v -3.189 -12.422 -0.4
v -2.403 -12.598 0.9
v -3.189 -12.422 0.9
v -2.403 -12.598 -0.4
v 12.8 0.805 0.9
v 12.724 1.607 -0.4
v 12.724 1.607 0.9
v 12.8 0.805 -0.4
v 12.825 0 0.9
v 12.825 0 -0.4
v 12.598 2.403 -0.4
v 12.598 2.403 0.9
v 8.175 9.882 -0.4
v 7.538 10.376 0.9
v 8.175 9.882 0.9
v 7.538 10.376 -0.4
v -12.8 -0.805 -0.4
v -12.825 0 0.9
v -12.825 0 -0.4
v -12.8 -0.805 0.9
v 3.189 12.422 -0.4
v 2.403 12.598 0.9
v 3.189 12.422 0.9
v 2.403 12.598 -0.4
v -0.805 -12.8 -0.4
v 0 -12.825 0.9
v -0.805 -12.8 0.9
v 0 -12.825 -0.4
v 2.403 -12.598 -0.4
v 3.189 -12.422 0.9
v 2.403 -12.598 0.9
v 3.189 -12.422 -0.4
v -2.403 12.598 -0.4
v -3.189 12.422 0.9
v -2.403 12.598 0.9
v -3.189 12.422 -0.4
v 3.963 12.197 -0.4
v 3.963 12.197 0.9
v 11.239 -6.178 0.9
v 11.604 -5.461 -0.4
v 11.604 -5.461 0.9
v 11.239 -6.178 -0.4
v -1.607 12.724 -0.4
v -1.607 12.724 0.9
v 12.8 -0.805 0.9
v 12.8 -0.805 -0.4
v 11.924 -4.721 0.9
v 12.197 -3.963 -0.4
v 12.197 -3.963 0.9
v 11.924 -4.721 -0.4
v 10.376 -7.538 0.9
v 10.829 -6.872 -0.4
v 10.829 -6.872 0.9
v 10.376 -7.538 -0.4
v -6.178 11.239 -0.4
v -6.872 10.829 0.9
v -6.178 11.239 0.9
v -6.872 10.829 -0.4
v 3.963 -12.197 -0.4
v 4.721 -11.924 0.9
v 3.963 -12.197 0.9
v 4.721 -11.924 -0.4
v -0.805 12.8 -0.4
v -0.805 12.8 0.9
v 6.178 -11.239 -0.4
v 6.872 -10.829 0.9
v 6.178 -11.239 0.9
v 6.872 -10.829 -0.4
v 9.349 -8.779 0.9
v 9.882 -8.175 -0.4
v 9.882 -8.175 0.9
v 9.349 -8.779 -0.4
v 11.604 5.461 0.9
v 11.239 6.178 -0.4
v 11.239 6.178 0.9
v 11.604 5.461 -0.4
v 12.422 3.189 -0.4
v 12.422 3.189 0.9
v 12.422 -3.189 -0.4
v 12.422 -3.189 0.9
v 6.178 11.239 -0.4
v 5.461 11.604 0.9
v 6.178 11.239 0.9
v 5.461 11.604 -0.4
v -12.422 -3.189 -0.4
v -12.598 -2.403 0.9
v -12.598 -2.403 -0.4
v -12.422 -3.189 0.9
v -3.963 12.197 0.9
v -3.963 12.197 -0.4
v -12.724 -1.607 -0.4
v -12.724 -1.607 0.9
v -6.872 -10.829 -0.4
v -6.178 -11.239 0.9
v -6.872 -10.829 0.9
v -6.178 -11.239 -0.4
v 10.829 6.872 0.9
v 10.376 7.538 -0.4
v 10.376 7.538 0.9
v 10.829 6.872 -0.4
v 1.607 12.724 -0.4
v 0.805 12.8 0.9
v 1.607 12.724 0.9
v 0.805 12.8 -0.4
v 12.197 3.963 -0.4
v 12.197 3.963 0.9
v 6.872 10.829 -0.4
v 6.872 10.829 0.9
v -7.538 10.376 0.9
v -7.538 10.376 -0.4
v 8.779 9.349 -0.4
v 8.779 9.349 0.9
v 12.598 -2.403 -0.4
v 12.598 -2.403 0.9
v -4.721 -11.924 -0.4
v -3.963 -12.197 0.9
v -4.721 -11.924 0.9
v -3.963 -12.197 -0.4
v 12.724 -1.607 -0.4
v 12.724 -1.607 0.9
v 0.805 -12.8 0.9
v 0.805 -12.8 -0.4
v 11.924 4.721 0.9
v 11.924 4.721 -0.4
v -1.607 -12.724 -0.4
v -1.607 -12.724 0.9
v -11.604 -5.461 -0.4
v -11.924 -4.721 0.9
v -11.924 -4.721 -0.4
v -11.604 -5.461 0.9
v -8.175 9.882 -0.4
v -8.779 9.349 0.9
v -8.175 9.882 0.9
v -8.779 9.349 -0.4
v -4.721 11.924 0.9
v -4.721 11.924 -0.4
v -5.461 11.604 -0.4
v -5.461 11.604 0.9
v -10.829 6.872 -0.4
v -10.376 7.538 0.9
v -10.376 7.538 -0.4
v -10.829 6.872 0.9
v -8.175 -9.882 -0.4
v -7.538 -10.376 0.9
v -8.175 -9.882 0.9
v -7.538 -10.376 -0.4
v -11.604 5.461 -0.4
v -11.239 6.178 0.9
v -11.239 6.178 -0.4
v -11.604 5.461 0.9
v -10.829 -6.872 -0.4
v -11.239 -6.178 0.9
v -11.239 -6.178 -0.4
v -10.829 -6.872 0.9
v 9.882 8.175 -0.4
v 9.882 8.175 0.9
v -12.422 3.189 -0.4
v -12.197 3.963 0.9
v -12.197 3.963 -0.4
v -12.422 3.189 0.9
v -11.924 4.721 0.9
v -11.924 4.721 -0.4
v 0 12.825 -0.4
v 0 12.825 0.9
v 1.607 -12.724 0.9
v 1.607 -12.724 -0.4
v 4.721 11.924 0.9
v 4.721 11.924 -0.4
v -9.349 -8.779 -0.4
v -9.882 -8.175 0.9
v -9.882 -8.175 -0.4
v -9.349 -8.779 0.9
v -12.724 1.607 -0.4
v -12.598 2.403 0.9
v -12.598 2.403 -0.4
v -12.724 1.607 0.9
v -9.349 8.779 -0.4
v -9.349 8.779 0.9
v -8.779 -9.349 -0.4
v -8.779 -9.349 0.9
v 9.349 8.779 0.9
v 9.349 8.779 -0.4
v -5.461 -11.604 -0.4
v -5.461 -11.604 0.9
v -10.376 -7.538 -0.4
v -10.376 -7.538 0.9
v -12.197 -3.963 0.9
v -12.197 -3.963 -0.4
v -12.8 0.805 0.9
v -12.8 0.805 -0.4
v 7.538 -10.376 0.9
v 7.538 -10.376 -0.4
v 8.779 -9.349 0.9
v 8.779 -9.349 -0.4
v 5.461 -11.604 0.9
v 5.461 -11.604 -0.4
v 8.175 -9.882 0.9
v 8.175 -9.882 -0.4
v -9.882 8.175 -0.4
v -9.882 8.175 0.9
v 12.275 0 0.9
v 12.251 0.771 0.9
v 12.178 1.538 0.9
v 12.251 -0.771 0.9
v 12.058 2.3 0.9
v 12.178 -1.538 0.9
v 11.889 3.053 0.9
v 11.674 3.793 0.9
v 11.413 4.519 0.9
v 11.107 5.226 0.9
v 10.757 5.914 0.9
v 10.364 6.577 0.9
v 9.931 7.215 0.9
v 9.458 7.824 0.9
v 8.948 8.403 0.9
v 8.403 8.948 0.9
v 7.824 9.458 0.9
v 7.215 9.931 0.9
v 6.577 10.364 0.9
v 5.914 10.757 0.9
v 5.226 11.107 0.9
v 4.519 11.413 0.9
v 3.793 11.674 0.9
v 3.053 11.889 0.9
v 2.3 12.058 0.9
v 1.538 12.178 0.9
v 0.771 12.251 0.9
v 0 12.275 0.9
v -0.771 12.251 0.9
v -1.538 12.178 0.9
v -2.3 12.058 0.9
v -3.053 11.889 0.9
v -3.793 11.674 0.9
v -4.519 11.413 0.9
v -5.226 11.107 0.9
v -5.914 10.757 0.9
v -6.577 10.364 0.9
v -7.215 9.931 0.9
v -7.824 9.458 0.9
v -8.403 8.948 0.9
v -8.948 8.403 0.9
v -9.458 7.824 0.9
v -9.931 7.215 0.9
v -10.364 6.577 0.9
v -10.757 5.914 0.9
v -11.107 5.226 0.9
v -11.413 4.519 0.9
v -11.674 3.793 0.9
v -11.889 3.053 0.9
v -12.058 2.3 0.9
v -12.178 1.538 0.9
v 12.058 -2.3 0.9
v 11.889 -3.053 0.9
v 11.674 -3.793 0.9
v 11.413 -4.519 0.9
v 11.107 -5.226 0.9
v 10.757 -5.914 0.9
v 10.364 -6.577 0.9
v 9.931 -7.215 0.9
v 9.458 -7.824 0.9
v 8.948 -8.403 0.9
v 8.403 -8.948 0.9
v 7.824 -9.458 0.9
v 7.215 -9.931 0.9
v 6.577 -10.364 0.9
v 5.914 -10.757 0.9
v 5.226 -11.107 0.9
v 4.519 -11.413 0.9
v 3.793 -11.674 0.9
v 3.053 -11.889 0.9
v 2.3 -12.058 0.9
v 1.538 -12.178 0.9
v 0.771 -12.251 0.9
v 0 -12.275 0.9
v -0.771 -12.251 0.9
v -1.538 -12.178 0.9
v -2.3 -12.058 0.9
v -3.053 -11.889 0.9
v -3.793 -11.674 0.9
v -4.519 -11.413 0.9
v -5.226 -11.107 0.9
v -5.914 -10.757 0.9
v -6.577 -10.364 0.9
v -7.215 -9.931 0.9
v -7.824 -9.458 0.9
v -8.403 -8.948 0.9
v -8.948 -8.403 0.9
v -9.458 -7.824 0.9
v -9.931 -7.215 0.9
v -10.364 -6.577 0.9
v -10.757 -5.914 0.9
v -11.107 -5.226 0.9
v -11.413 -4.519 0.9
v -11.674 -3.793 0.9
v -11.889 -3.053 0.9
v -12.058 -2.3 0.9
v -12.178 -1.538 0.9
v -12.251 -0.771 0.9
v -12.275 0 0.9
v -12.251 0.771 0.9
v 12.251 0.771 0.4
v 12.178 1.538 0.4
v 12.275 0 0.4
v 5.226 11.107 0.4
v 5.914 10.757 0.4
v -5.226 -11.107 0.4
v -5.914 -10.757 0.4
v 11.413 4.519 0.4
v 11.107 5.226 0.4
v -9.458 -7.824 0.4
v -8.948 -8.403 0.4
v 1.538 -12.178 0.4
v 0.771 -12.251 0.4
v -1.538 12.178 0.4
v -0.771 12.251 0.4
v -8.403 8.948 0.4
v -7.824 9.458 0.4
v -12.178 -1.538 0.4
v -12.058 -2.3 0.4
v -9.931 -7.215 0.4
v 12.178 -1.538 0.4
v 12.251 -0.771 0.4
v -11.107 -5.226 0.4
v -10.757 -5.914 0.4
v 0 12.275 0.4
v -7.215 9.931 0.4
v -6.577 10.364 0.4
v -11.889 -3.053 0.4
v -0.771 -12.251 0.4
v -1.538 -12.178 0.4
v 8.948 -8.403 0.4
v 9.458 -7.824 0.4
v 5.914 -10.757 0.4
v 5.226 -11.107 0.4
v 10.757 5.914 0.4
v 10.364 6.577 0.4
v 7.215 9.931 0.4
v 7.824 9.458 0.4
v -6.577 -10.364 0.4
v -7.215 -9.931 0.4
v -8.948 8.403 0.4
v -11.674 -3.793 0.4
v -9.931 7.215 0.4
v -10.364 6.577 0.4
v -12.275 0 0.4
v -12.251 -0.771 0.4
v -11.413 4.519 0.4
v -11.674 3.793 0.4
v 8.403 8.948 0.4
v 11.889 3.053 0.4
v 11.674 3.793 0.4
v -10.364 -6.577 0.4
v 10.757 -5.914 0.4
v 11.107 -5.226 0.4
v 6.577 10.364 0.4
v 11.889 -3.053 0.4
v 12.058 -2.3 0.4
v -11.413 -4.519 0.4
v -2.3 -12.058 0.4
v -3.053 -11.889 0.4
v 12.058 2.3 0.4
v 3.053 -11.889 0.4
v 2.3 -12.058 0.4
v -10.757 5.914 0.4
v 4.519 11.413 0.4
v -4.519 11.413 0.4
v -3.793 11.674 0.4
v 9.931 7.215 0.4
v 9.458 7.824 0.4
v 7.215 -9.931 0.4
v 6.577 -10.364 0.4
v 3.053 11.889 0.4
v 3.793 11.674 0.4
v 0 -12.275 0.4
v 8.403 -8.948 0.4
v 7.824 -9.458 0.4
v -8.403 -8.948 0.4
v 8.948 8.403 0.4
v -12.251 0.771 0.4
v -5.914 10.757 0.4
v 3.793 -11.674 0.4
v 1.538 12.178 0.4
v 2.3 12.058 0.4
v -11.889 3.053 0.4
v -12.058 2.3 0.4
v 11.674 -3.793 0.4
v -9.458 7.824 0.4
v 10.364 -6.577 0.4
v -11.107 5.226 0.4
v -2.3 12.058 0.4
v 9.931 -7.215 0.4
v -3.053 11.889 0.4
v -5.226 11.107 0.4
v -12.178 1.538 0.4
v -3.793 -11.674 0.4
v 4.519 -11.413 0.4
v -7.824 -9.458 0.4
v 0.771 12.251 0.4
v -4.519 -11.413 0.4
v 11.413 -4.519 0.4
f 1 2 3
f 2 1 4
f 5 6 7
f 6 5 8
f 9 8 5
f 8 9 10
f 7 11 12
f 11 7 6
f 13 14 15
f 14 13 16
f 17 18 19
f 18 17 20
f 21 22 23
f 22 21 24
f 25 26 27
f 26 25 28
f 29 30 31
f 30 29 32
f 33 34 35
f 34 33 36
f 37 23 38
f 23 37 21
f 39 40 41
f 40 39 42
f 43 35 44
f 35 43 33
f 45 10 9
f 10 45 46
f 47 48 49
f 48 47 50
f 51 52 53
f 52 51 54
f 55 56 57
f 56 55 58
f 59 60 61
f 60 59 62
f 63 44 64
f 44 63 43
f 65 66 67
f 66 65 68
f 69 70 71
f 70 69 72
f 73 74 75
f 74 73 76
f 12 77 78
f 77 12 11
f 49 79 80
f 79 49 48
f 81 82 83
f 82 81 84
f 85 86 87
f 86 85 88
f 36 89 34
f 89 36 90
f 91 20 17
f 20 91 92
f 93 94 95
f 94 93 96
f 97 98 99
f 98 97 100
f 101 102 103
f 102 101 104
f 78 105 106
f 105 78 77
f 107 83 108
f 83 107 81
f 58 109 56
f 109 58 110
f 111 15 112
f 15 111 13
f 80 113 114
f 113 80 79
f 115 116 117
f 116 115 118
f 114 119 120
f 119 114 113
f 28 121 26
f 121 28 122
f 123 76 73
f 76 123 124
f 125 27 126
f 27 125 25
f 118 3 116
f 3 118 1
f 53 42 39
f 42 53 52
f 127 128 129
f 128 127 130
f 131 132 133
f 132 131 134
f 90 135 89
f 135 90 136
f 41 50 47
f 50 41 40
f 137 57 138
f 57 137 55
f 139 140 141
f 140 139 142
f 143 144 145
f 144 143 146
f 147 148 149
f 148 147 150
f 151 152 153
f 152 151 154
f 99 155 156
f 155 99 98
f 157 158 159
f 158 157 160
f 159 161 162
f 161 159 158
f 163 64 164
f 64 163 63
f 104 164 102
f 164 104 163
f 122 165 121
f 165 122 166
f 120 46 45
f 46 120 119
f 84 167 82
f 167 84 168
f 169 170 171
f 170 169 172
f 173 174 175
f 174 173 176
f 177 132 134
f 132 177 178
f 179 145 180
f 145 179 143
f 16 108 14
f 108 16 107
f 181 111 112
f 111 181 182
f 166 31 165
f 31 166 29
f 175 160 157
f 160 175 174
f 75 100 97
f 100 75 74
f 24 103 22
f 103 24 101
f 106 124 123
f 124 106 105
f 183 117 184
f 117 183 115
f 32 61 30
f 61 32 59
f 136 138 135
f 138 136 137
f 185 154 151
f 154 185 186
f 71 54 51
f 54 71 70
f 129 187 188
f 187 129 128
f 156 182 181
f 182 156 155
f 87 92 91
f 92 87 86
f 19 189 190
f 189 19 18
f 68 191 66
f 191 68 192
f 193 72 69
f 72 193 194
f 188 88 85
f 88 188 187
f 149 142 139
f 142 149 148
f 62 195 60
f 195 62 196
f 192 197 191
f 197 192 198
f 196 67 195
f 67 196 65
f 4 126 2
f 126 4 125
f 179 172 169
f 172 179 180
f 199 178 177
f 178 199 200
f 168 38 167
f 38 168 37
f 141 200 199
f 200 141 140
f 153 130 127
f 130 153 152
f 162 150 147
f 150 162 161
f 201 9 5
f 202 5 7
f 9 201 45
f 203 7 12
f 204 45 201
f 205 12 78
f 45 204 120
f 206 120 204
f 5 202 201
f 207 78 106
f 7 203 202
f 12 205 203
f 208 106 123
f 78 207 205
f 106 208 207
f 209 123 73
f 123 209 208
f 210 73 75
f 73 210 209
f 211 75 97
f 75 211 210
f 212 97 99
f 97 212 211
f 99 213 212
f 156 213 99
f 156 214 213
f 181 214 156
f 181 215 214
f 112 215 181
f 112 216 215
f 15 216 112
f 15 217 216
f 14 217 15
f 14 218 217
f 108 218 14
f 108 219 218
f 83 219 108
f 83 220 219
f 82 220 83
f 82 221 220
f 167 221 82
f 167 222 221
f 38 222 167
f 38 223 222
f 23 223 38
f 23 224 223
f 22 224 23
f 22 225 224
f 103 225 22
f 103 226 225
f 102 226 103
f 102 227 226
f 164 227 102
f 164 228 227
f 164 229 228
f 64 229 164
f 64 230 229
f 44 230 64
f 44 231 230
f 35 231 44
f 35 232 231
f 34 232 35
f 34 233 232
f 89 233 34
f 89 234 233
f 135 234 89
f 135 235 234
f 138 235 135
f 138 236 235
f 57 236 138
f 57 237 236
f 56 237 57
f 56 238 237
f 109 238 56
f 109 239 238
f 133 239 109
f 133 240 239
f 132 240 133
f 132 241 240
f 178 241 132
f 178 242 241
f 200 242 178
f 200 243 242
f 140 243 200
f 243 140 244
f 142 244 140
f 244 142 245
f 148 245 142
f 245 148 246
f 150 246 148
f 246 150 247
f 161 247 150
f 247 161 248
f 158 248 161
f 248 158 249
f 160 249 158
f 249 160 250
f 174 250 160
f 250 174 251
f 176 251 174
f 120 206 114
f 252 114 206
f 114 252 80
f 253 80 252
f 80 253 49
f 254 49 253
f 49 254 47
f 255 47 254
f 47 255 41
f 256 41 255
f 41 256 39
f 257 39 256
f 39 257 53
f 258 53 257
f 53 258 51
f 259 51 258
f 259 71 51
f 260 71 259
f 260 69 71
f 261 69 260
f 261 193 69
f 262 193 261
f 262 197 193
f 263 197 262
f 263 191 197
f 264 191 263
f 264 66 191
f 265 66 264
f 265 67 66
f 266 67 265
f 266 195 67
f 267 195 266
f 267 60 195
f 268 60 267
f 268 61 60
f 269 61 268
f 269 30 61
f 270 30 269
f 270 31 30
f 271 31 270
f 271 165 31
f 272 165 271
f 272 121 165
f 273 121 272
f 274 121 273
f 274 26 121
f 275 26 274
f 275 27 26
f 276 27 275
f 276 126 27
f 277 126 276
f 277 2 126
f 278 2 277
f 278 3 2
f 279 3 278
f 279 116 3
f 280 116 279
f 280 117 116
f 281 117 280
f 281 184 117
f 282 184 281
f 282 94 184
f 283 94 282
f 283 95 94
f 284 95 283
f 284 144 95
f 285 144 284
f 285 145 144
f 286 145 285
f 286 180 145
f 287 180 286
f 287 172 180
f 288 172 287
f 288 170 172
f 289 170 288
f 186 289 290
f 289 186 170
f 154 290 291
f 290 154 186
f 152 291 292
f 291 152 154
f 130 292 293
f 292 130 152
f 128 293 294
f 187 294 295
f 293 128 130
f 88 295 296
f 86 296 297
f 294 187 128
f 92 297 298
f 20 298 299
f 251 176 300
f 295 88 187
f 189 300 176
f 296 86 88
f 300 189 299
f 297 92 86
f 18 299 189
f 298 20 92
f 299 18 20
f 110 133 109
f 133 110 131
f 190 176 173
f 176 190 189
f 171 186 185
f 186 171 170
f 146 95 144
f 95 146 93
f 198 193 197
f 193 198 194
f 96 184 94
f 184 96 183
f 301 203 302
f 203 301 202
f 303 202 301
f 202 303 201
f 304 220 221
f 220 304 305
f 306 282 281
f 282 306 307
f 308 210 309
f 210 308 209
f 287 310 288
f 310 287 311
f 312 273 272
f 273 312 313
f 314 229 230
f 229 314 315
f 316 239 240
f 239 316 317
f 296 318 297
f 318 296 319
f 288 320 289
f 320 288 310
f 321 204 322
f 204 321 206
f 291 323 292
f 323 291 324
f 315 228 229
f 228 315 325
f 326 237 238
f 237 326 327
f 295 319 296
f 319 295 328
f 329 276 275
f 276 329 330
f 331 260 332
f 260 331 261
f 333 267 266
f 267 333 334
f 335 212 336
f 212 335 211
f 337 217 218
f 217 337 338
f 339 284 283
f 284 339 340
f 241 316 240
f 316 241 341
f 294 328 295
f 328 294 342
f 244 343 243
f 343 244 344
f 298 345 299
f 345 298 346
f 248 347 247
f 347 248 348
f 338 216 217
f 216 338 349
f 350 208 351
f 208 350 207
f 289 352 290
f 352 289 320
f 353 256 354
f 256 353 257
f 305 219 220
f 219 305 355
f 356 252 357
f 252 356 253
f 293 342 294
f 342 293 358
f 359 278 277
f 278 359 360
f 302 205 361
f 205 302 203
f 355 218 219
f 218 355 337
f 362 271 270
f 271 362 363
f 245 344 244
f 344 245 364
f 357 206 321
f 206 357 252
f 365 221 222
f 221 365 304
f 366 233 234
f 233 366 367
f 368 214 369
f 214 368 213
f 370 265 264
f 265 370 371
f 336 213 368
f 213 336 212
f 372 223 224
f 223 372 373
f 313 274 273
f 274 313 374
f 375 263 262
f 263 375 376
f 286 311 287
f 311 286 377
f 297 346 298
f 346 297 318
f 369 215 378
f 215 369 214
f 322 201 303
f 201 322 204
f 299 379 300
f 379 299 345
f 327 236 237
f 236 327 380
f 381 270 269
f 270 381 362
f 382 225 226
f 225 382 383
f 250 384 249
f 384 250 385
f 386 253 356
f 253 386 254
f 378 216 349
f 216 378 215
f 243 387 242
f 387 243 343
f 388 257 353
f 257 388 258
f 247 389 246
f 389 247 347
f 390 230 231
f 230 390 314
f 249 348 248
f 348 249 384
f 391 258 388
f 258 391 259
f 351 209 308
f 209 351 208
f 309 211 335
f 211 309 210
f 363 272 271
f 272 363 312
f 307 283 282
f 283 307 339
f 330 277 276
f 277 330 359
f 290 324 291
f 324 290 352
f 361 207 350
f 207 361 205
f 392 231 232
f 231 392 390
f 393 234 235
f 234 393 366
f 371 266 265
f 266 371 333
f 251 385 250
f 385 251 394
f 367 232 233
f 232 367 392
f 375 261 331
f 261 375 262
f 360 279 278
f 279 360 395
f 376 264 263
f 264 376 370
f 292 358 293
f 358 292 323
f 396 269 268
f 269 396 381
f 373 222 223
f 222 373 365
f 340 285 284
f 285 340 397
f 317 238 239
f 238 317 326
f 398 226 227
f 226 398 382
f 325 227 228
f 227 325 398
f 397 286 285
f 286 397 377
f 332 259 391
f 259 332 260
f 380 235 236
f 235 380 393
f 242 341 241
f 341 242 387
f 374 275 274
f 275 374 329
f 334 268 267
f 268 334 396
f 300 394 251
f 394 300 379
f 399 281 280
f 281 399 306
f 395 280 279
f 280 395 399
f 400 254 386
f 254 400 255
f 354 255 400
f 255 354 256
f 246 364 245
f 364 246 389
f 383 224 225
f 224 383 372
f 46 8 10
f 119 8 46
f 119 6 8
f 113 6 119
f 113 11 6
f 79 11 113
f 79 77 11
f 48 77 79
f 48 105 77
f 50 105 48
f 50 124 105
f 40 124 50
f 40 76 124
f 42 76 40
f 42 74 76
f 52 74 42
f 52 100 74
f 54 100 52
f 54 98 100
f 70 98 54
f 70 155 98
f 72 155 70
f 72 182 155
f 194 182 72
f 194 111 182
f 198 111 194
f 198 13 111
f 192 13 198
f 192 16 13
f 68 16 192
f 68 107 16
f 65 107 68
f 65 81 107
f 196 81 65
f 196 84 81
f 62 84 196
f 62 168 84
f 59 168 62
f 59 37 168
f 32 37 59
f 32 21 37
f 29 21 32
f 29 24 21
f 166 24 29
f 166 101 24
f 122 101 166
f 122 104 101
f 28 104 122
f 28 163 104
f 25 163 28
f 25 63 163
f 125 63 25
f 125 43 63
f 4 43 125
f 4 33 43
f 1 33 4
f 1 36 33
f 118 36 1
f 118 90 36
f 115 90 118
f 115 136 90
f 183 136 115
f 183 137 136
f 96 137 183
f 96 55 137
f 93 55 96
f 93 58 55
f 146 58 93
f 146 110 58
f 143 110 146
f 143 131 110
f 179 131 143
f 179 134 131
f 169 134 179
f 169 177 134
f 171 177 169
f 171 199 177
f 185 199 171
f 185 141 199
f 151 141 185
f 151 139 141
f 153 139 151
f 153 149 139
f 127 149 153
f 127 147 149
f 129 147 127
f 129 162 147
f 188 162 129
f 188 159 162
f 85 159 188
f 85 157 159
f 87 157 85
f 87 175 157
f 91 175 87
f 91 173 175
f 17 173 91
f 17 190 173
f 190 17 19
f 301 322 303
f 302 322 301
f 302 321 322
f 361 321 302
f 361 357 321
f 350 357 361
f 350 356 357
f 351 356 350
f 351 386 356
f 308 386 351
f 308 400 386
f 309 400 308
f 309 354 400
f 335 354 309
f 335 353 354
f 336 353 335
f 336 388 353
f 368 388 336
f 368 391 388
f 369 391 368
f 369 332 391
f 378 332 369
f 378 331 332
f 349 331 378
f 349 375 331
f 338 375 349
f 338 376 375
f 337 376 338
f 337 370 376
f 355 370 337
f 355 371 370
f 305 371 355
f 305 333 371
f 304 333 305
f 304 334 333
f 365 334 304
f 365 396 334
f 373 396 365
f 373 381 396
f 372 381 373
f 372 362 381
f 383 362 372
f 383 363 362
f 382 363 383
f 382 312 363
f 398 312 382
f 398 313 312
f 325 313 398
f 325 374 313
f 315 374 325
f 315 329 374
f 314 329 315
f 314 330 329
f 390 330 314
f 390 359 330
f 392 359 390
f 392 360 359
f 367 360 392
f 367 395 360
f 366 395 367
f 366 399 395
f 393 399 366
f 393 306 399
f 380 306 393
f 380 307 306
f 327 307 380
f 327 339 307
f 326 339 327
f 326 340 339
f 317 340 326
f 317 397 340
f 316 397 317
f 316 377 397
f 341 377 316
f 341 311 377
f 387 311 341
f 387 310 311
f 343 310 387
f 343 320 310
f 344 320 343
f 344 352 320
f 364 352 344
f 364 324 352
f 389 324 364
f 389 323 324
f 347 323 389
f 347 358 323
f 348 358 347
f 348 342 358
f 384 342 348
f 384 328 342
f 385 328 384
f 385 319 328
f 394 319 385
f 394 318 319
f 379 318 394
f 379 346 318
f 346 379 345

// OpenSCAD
diametre_piece = 25.65;
epaisseur_piece = 2.5;
epaisseur_relief = 0.55;



    
module anneau(){
    difference(){
        cylinder (d=diametre_piece, h=2*epaisseur_relief, $fn=100, center=true);
        cylinder (d=diametre_piece-2*epaisseur_relief, h=2*epaisseur_relief+2, $fn=100, center=true);
    }
}

module pile(){
   anneau();
   translate([-6,-11.7,-epaisseur_relief])
   linear_extrude(2*epaisseur_relief) 
   scale(0.18) import("1.dxf");
}

module face1(){
   anneau();
    difference(){
   translate([-12,-12.5,-epaisseur_relief])
   linear_extrude(2*epaisseur_relief) 
   scale(0.18) import("portrait.dxf");
        difference(){
        cylinder (d=2*diametre_piece, h=4*epaisseur_relief, $fn=100, center=true);
        cylinder (d=diametre_piece-2*epaisseur_relief, h=4*epaisseur_relief+2, $fn=100, center=true);
    }
    }
}

module face2(){
   anneau();
    difference(){
   translate([-15.5,-5.5,-epaisseur_relief])
   rotate([0,0,-25])
    linear_extrude(2*epaisseur_relief) 
   scale(0.185) import("logo.dxf");
        difference(){
        cylinder (d=5*diametre_piece, h=4*epaisseur_relief, $fn=100, center=true);
        cylinder (d=diametre_piece-2*epaisseur_relief, h=4*epaisseur_relief+2, $fn=100, center=true);
    }
    }
}

module piece1(){
    hauteur = epaisseur_piece-2*epaisseur_relief;
    cylinder (d=diametre_piece, h=hauteur+0.1, $fn=100, center=true);
    translate([0,0,hauteur/2])
    pile();
    translate([0,0,-hauteur/2])
    face1();
}

module piece2(){
    hauteur = epaisseur_piece-2*epaisseur_relief;
    cylinder (d=diametre_piece, h=hauteur+0.1, $fn=100, center=true);
    translate([0,0,hauteur/2])
    pile();
    translate([0,0,-hauteur/2])
    face2();
}

module piece_face(){
    hauteur = epaisseur_piece/2-epaisseur_relief;
    cylinder (d=diametre_piece, h=hauteur+0.1, $fn=100, center=true);
    translate([0,0,hauteur/2])
    face1();
}

module piece_pile(){
    hauteur = epaisseur_piece/2-epaisseur_relief;
    cylinder (d=diametre_piece, h=hauteur+0.1, $fn=100, center=true);
    translate([0,0,hauteur/2])
    pile();
}

piece_face();
